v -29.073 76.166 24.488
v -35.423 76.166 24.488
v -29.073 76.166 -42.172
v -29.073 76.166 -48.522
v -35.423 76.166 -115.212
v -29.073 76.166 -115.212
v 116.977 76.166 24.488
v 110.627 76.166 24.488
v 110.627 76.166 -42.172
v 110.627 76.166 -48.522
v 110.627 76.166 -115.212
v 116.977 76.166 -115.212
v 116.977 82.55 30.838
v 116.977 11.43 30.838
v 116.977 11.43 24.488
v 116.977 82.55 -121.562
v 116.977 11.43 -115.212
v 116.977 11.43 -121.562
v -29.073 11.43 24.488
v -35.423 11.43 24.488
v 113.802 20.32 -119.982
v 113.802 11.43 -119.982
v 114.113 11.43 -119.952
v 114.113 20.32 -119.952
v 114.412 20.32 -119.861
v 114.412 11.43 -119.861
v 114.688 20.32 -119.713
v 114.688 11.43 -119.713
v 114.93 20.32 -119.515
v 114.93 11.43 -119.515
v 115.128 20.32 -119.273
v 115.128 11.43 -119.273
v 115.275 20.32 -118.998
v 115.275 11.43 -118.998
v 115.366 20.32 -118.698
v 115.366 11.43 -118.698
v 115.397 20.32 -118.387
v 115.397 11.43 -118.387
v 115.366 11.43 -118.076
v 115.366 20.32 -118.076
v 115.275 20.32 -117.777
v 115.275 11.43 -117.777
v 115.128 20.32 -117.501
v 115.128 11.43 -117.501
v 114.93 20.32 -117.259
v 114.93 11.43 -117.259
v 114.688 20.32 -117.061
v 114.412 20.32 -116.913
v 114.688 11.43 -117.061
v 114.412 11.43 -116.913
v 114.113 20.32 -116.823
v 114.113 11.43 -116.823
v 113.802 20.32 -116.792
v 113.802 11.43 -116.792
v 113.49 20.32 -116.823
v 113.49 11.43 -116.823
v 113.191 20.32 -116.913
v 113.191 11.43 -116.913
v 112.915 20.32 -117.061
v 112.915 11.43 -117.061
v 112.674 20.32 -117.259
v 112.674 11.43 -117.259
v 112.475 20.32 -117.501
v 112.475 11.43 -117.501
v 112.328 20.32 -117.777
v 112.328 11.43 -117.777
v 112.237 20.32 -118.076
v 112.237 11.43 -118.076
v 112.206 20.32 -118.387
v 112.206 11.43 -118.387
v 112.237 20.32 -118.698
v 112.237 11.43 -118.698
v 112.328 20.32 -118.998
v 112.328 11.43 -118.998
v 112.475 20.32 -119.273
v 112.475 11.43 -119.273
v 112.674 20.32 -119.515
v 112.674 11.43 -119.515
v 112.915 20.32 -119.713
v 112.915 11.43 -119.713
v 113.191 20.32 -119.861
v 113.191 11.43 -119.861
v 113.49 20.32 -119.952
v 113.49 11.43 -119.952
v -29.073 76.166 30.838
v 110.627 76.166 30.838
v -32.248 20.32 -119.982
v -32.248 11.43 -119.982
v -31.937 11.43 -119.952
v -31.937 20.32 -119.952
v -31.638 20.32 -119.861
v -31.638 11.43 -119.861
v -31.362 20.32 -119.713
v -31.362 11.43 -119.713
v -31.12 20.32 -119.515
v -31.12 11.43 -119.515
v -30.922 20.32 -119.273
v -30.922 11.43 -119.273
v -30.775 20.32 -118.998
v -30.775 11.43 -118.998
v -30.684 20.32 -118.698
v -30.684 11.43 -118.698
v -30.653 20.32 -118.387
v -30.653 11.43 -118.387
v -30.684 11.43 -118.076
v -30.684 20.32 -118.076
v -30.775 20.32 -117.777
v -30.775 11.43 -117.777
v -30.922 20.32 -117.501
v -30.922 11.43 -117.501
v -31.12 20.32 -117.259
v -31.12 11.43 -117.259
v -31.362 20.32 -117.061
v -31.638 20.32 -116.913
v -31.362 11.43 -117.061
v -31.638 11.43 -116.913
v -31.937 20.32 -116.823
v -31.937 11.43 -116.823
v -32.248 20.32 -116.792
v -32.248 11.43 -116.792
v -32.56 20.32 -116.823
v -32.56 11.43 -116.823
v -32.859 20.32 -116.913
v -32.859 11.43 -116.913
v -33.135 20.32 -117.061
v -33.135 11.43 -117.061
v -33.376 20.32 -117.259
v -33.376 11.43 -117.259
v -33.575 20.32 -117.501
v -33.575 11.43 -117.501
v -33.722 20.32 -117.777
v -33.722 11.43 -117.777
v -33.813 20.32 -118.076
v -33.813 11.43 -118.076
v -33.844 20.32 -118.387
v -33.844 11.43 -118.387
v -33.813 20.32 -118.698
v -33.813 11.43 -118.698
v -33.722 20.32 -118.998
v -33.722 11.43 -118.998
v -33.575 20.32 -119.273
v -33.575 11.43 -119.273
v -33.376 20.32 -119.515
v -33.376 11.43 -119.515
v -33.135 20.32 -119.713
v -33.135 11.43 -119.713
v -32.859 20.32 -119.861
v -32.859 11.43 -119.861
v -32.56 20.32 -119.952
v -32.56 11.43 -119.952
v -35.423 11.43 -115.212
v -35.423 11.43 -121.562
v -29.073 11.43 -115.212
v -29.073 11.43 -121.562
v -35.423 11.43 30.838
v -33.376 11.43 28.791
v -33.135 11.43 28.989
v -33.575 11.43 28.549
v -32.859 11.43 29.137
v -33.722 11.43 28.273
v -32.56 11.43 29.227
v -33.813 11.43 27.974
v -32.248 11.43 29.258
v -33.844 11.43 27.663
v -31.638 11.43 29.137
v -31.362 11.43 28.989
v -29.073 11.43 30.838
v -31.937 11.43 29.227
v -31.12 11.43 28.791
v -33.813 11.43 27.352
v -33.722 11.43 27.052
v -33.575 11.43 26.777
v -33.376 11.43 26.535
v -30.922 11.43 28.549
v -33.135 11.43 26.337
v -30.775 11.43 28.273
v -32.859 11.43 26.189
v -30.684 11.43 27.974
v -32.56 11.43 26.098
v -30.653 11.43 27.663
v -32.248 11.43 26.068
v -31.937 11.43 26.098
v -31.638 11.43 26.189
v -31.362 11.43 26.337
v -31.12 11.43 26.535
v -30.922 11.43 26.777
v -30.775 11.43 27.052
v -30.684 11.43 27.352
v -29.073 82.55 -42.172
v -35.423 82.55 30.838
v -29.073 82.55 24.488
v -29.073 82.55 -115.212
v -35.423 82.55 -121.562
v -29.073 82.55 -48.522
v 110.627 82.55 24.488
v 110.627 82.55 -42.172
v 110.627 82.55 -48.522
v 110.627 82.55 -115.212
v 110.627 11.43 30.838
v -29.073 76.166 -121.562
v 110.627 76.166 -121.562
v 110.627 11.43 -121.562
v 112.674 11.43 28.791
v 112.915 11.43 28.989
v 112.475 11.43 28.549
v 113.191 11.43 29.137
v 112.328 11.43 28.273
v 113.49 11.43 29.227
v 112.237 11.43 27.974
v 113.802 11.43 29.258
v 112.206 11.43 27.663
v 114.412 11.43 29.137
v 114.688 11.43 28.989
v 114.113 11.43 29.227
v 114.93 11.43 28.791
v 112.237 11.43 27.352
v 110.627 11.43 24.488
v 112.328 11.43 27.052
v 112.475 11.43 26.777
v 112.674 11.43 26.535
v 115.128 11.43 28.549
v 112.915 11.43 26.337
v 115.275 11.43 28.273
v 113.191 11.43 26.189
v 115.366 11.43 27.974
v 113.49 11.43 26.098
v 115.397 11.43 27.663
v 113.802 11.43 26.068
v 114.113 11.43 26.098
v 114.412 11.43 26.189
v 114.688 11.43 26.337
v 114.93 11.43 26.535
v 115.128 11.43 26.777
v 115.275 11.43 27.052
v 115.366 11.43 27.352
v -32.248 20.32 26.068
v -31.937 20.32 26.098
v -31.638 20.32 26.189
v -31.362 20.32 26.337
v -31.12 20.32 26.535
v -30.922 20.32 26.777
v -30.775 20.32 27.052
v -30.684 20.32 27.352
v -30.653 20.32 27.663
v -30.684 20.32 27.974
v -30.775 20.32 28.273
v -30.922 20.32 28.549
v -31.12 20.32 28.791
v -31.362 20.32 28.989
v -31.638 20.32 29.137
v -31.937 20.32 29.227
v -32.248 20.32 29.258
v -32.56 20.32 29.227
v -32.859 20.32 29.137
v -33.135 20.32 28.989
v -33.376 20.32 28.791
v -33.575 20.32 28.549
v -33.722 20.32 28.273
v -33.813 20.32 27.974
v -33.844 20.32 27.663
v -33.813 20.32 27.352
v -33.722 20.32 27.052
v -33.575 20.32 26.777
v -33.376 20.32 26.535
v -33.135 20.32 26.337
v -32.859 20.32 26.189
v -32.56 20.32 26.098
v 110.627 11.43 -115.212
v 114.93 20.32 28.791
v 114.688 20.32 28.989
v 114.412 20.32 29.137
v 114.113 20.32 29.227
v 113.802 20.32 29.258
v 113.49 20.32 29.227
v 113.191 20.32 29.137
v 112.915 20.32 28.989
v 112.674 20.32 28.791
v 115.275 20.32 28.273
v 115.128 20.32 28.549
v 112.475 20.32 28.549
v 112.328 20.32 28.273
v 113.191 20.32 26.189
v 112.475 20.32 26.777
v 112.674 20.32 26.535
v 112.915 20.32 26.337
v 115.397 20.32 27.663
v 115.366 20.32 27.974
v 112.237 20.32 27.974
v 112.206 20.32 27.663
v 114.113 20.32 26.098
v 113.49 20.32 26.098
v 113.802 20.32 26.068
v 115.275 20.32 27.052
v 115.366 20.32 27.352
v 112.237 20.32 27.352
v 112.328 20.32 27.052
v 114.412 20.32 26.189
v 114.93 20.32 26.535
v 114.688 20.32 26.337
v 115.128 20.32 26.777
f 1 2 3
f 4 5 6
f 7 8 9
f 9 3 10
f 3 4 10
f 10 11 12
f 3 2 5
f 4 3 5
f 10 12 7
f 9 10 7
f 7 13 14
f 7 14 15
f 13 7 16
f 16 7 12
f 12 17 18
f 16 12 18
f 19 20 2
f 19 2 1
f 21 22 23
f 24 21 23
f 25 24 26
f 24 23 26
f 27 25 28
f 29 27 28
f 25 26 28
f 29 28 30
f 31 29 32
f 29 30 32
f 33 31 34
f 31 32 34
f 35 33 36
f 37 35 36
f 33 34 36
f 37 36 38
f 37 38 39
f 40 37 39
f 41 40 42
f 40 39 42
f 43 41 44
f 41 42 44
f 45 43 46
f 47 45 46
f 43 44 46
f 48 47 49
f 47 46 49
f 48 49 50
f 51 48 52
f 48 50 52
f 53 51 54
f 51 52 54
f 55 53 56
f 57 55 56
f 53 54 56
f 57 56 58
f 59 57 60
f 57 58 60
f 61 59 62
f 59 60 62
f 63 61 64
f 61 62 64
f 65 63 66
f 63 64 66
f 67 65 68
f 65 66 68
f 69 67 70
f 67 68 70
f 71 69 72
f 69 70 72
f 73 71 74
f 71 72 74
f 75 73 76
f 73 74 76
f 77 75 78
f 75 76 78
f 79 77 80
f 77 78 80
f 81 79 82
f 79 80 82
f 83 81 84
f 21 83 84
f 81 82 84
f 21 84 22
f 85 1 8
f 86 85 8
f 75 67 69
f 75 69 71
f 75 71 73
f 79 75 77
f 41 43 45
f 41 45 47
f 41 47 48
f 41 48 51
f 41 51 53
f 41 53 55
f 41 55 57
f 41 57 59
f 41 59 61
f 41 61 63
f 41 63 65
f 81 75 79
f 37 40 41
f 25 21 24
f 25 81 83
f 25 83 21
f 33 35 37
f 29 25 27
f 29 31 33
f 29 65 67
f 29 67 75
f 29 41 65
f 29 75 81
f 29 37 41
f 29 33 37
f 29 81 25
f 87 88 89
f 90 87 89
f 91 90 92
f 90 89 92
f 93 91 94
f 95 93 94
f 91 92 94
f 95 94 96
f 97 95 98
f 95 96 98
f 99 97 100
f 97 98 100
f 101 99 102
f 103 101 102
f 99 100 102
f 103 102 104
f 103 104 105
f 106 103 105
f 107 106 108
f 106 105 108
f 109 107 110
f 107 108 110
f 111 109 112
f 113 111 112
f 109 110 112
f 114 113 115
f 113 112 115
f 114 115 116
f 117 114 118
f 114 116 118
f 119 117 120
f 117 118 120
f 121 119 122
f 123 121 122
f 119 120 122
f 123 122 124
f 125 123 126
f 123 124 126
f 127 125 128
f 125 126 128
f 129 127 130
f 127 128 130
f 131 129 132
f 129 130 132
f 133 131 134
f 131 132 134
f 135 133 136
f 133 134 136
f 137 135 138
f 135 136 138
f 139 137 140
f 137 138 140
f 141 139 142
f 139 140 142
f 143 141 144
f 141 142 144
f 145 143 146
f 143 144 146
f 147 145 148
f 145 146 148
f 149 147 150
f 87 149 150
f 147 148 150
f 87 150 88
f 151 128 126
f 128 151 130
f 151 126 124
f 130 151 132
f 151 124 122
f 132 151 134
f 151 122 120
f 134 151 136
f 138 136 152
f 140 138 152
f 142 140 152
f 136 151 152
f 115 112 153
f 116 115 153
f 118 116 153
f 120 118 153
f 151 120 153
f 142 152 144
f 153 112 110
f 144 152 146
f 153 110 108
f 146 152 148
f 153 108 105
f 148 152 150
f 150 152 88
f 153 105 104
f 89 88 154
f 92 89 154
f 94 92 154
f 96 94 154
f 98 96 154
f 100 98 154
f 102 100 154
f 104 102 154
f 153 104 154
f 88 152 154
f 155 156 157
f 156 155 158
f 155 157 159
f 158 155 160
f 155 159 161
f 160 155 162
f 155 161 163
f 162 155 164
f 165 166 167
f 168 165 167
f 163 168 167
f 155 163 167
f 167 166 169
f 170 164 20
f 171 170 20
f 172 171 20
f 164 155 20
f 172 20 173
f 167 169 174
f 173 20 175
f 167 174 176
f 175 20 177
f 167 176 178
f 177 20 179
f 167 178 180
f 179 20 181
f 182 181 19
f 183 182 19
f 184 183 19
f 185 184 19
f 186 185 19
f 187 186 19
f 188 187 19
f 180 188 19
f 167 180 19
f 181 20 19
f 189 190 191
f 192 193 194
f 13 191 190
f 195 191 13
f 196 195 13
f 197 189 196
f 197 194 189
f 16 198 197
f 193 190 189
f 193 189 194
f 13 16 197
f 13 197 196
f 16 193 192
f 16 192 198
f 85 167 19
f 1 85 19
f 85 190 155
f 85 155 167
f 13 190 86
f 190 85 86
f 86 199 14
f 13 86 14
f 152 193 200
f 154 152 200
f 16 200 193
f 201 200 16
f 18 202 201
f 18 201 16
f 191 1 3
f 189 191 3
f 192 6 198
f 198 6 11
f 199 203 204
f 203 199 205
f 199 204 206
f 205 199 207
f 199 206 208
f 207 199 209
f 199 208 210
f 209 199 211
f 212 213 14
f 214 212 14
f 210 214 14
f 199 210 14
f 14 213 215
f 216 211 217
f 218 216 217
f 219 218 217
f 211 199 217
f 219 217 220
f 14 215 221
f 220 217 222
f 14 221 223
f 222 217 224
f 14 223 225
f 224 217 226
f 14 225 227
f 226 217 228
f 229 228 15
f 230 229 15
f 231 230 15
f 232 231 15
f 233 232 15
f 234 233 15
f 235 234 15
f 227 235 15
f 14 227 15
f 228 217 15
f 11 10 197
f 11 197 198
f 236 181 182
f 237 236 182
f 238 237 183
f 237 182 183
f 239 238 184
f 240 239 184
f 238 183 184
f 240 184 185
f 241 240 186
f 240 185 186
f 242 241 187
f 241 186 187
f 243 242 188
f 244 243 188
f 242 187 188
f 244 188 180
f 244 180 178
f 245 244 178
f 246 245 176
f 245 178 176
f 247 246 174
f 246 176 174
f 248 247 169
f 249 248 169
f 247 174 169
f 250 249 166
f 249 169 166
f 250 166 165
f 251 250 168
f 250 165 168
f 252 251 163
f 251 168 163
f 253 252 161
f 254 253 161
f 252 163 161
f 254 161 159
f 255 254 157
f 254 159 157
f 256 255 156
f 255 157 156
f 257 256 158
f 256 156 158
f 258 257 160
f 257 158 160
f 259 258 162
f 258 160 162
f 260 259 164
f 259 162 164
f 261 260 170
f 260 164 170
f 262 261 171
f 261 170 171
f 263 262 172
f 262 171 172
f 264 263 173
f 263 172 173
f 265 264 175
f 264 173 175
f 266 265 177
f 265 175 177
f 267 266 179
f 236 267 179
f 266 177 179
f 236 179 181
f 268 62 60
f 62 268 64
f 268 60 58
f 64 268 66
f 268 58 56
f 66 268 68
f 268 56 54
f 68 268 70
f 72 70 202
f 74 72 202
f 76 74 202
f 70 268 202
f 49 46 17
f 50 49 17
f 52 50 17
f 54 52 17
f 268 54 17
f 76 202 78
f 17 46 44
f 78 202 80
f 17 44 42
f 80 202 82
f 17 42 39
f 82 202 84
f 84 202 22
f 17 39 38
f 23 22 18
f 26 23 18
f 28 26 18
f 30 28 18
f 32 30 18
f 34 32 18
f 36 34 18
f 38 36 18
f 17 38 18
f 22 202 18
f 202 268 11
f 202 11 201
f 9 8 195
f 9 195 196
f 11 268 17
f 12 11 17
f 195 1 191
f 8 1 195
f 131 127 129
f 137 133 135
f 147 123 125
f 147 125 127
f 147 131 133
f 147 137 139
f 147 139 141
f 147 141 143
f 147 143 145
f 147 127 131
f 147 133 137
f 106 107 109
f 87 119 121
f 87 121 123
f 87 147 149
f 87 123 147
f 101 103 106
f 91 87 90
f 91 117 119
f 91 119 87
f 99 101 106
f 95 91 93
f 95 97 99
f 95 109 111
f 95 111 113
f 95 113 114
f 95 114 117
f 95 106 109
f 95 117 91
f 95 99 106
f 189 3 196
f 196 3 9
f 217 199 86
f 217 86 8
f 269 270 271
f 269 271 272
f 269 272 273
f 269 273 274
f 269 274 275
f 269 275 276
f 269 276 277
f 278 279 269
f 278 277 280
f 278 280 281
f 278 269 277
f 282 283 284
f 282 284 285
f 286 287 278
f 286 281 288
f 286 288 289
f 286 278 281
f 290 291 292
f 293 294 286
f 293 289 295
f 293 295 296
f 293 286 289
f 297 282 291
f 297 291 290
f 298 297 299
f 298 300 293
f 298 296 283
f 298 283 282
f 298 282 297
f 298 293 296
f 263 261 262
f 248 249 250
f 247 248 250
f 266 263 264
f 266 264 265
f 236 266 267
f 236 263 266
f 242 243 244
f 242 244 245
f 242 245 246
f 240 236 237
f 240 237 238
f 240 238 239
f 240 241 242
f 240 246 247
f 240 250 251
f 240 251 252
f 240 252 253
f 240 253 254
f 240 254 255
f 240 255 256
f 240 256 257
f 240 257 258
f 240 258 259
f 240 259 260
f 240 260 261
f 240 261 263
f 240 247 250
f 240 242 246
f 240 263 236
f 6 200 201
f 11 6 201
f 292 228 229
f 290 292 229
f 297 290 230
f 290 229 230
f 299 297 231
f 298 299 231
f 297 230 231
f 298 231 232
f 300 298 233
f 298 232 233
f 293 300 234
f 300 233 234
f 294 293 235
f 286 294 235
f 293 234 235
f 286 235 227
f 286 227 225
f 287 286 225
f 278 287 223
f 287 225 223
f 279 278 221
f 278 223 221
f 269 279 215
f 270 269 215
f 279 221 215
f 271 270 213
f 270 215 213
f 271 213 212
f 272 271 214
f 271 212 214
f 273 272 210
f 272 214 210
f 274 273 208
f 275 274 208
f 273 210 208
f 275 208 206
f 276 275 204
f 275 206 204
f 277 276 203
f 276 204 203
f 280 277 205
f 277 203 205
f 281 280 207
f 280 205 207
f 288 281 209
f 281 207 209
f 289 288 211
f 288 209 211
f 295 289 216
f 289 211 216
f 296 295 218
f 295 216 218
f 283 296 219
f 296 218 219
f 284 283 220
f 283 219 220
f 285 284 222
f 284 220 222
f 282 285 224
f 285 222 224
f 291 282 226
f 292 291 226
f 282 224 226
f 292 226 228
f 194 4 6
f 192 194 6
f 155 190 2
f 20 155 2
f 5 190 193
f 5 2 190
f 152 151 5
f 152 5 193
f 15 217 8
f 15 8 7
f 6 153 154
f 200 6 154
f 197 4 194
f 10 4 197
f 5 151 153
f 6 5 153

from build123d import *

# Parameters (mm, degrees)
STOCK_PLATE_BETA1_1_START       = 76.165904354
STOCK_PLATE_BETA1_1_OUTLINE_W   = 152.4
STOCK_PLATE_BETA1_1_OUTLINE_H   = 152.4
STOCK_PLATE_BETA1_1_OUTLINE_W_2 = 139.7
STOCK_PLATE_BETA1_1_OUTLINE_H_2 = 66.690053594
STOCK_PLATE_BETA1_1_OUTLINE_H_3 = 66.659946406
STOCK_PLATE_BETA1_1_DEPTH       = 6.384095646
STOCK_PLATE_BETA1_1_START_2     = 11.43
STOCK_PLATE_BETA1_1_2_OUTLINE_W = 6.35
STOCK_PLATE_BETA1_1_2_OUTLINE_H = 6.35
STOCK_PLATE_BETA1_1_2_DEPTH     = 64.735904354
SKETCH1_R                       = 1.59512
CUT_EXTRUDE2_DEPTH              = 8.89


# Read off the part's stored shape, not the designer's step: Stock-plate_beta1-1
with BuildPart() as part:
    # Stock-plate_beta1-1 outline → Stock-plate_beta1-1 (new body)
    with BuildSketch(Plane(origin=(0, 0, 0), x_dir=(1, 0, 0), z_dir=(0, 1, 0)).offset(STOCK_PLATE_BETA1_1_START)):
        with Locations((40.776583963, 45.362139437)):
            Rectangle(STOCK_PLATE_BETA1_1_OUTLINE_W, STOCK_PLATE_BETA1_1_OUTLINE_H)
        with Locations((40.776583963, 81.86711264)):
            Rectangle(STOCK_PLATE_BETA1_1_OUTLINE_W_2, STOCK_PLATE_BETA1_1_OUTLINE_H_2, mode=Mode.SUBTRACT)
        with Locations((40.776583963, 8.84211264)):
            Rectangle(STOCK_PLATE_BETA1_1_OUTLINE_W_2, STOCK_PLATE_BETA1_1_OUTLINE_H_3, mode=Mode.SUBTRACT)
    extrude(amount=STOCK_PLATE_BETA1_1_DEPTH)

    # Stock-plate_beta1-1 2 outline → Stock-plate_beta1-1 2 (add)
    with BuildSketch(Plane(origin=(0, 0, 0), x_dir=(1, 0, 0), z_dir=(0, 1, 0)).offset(STOCK_PLATE_BETA1_1_START_2)):
        with Locations((-32.248416037, 118.387139437)):
            Rectangle(STOCK_PLATE_BETA1_1_2_OUTLINE_W, STOCK_PLATE_BETA1_1_2_OUTLINE_H)
        with Locations((113.801583963, 118.387139437)):
            Rectangle(STOCK_PLATE_BETA1_1_2_OUTLINE_W, STOCK_PLATE_BETA1_1_2_OUTLINE_H)
        with Locations((-32.248416037, -27.662860563)):
            Rectangle(STOCK_PLATE_BETA1_1_2_OUTLINE_W, STOCK_PLATE_BETA1_1_2_OUTLINE_H)
        with Locations((113.801583963, -27.662860563)):
            Rectangle(STOCK_PLATE_BETA1_1_2_OUTLINE_W, STOCK_PLATE_BETA1_1_2_OUTLINE_H)
    extrude(amount=STOCK_PLATE_BETA1_1_2_DEPTH)

    # Sketch1 → Cut-Extrude2 (cut)
    with BuildSketch(Plane(origin=(0, 11.43, 0), x_dir=(-1, 0, 0), z_dir=(0, -1, 0))):
        with Locations(Location((32.248416037, -27.662860563, 0), (0, 0, 90))):
            Circle(SKETCH1_R)
        with Locations(Location((-113.801583963, -27.662860563, 0), (0, 0, 90))):
            Circle(SKETCH1_R)
        with Locations(Location((-113.801583963, 118.387139437, 0), (0, 0, 90))):
            Circle(SKETCH1_R)
        with Locations(Location((32.248416037, 118.387139437, 0), (0, 0, 90))):
            Circle(SKETCH1_R)
    extrude(amount=-CUT_EXTRUDE2_DEPTH, mode=Mode.SUBTRACT)


solid = part.part
